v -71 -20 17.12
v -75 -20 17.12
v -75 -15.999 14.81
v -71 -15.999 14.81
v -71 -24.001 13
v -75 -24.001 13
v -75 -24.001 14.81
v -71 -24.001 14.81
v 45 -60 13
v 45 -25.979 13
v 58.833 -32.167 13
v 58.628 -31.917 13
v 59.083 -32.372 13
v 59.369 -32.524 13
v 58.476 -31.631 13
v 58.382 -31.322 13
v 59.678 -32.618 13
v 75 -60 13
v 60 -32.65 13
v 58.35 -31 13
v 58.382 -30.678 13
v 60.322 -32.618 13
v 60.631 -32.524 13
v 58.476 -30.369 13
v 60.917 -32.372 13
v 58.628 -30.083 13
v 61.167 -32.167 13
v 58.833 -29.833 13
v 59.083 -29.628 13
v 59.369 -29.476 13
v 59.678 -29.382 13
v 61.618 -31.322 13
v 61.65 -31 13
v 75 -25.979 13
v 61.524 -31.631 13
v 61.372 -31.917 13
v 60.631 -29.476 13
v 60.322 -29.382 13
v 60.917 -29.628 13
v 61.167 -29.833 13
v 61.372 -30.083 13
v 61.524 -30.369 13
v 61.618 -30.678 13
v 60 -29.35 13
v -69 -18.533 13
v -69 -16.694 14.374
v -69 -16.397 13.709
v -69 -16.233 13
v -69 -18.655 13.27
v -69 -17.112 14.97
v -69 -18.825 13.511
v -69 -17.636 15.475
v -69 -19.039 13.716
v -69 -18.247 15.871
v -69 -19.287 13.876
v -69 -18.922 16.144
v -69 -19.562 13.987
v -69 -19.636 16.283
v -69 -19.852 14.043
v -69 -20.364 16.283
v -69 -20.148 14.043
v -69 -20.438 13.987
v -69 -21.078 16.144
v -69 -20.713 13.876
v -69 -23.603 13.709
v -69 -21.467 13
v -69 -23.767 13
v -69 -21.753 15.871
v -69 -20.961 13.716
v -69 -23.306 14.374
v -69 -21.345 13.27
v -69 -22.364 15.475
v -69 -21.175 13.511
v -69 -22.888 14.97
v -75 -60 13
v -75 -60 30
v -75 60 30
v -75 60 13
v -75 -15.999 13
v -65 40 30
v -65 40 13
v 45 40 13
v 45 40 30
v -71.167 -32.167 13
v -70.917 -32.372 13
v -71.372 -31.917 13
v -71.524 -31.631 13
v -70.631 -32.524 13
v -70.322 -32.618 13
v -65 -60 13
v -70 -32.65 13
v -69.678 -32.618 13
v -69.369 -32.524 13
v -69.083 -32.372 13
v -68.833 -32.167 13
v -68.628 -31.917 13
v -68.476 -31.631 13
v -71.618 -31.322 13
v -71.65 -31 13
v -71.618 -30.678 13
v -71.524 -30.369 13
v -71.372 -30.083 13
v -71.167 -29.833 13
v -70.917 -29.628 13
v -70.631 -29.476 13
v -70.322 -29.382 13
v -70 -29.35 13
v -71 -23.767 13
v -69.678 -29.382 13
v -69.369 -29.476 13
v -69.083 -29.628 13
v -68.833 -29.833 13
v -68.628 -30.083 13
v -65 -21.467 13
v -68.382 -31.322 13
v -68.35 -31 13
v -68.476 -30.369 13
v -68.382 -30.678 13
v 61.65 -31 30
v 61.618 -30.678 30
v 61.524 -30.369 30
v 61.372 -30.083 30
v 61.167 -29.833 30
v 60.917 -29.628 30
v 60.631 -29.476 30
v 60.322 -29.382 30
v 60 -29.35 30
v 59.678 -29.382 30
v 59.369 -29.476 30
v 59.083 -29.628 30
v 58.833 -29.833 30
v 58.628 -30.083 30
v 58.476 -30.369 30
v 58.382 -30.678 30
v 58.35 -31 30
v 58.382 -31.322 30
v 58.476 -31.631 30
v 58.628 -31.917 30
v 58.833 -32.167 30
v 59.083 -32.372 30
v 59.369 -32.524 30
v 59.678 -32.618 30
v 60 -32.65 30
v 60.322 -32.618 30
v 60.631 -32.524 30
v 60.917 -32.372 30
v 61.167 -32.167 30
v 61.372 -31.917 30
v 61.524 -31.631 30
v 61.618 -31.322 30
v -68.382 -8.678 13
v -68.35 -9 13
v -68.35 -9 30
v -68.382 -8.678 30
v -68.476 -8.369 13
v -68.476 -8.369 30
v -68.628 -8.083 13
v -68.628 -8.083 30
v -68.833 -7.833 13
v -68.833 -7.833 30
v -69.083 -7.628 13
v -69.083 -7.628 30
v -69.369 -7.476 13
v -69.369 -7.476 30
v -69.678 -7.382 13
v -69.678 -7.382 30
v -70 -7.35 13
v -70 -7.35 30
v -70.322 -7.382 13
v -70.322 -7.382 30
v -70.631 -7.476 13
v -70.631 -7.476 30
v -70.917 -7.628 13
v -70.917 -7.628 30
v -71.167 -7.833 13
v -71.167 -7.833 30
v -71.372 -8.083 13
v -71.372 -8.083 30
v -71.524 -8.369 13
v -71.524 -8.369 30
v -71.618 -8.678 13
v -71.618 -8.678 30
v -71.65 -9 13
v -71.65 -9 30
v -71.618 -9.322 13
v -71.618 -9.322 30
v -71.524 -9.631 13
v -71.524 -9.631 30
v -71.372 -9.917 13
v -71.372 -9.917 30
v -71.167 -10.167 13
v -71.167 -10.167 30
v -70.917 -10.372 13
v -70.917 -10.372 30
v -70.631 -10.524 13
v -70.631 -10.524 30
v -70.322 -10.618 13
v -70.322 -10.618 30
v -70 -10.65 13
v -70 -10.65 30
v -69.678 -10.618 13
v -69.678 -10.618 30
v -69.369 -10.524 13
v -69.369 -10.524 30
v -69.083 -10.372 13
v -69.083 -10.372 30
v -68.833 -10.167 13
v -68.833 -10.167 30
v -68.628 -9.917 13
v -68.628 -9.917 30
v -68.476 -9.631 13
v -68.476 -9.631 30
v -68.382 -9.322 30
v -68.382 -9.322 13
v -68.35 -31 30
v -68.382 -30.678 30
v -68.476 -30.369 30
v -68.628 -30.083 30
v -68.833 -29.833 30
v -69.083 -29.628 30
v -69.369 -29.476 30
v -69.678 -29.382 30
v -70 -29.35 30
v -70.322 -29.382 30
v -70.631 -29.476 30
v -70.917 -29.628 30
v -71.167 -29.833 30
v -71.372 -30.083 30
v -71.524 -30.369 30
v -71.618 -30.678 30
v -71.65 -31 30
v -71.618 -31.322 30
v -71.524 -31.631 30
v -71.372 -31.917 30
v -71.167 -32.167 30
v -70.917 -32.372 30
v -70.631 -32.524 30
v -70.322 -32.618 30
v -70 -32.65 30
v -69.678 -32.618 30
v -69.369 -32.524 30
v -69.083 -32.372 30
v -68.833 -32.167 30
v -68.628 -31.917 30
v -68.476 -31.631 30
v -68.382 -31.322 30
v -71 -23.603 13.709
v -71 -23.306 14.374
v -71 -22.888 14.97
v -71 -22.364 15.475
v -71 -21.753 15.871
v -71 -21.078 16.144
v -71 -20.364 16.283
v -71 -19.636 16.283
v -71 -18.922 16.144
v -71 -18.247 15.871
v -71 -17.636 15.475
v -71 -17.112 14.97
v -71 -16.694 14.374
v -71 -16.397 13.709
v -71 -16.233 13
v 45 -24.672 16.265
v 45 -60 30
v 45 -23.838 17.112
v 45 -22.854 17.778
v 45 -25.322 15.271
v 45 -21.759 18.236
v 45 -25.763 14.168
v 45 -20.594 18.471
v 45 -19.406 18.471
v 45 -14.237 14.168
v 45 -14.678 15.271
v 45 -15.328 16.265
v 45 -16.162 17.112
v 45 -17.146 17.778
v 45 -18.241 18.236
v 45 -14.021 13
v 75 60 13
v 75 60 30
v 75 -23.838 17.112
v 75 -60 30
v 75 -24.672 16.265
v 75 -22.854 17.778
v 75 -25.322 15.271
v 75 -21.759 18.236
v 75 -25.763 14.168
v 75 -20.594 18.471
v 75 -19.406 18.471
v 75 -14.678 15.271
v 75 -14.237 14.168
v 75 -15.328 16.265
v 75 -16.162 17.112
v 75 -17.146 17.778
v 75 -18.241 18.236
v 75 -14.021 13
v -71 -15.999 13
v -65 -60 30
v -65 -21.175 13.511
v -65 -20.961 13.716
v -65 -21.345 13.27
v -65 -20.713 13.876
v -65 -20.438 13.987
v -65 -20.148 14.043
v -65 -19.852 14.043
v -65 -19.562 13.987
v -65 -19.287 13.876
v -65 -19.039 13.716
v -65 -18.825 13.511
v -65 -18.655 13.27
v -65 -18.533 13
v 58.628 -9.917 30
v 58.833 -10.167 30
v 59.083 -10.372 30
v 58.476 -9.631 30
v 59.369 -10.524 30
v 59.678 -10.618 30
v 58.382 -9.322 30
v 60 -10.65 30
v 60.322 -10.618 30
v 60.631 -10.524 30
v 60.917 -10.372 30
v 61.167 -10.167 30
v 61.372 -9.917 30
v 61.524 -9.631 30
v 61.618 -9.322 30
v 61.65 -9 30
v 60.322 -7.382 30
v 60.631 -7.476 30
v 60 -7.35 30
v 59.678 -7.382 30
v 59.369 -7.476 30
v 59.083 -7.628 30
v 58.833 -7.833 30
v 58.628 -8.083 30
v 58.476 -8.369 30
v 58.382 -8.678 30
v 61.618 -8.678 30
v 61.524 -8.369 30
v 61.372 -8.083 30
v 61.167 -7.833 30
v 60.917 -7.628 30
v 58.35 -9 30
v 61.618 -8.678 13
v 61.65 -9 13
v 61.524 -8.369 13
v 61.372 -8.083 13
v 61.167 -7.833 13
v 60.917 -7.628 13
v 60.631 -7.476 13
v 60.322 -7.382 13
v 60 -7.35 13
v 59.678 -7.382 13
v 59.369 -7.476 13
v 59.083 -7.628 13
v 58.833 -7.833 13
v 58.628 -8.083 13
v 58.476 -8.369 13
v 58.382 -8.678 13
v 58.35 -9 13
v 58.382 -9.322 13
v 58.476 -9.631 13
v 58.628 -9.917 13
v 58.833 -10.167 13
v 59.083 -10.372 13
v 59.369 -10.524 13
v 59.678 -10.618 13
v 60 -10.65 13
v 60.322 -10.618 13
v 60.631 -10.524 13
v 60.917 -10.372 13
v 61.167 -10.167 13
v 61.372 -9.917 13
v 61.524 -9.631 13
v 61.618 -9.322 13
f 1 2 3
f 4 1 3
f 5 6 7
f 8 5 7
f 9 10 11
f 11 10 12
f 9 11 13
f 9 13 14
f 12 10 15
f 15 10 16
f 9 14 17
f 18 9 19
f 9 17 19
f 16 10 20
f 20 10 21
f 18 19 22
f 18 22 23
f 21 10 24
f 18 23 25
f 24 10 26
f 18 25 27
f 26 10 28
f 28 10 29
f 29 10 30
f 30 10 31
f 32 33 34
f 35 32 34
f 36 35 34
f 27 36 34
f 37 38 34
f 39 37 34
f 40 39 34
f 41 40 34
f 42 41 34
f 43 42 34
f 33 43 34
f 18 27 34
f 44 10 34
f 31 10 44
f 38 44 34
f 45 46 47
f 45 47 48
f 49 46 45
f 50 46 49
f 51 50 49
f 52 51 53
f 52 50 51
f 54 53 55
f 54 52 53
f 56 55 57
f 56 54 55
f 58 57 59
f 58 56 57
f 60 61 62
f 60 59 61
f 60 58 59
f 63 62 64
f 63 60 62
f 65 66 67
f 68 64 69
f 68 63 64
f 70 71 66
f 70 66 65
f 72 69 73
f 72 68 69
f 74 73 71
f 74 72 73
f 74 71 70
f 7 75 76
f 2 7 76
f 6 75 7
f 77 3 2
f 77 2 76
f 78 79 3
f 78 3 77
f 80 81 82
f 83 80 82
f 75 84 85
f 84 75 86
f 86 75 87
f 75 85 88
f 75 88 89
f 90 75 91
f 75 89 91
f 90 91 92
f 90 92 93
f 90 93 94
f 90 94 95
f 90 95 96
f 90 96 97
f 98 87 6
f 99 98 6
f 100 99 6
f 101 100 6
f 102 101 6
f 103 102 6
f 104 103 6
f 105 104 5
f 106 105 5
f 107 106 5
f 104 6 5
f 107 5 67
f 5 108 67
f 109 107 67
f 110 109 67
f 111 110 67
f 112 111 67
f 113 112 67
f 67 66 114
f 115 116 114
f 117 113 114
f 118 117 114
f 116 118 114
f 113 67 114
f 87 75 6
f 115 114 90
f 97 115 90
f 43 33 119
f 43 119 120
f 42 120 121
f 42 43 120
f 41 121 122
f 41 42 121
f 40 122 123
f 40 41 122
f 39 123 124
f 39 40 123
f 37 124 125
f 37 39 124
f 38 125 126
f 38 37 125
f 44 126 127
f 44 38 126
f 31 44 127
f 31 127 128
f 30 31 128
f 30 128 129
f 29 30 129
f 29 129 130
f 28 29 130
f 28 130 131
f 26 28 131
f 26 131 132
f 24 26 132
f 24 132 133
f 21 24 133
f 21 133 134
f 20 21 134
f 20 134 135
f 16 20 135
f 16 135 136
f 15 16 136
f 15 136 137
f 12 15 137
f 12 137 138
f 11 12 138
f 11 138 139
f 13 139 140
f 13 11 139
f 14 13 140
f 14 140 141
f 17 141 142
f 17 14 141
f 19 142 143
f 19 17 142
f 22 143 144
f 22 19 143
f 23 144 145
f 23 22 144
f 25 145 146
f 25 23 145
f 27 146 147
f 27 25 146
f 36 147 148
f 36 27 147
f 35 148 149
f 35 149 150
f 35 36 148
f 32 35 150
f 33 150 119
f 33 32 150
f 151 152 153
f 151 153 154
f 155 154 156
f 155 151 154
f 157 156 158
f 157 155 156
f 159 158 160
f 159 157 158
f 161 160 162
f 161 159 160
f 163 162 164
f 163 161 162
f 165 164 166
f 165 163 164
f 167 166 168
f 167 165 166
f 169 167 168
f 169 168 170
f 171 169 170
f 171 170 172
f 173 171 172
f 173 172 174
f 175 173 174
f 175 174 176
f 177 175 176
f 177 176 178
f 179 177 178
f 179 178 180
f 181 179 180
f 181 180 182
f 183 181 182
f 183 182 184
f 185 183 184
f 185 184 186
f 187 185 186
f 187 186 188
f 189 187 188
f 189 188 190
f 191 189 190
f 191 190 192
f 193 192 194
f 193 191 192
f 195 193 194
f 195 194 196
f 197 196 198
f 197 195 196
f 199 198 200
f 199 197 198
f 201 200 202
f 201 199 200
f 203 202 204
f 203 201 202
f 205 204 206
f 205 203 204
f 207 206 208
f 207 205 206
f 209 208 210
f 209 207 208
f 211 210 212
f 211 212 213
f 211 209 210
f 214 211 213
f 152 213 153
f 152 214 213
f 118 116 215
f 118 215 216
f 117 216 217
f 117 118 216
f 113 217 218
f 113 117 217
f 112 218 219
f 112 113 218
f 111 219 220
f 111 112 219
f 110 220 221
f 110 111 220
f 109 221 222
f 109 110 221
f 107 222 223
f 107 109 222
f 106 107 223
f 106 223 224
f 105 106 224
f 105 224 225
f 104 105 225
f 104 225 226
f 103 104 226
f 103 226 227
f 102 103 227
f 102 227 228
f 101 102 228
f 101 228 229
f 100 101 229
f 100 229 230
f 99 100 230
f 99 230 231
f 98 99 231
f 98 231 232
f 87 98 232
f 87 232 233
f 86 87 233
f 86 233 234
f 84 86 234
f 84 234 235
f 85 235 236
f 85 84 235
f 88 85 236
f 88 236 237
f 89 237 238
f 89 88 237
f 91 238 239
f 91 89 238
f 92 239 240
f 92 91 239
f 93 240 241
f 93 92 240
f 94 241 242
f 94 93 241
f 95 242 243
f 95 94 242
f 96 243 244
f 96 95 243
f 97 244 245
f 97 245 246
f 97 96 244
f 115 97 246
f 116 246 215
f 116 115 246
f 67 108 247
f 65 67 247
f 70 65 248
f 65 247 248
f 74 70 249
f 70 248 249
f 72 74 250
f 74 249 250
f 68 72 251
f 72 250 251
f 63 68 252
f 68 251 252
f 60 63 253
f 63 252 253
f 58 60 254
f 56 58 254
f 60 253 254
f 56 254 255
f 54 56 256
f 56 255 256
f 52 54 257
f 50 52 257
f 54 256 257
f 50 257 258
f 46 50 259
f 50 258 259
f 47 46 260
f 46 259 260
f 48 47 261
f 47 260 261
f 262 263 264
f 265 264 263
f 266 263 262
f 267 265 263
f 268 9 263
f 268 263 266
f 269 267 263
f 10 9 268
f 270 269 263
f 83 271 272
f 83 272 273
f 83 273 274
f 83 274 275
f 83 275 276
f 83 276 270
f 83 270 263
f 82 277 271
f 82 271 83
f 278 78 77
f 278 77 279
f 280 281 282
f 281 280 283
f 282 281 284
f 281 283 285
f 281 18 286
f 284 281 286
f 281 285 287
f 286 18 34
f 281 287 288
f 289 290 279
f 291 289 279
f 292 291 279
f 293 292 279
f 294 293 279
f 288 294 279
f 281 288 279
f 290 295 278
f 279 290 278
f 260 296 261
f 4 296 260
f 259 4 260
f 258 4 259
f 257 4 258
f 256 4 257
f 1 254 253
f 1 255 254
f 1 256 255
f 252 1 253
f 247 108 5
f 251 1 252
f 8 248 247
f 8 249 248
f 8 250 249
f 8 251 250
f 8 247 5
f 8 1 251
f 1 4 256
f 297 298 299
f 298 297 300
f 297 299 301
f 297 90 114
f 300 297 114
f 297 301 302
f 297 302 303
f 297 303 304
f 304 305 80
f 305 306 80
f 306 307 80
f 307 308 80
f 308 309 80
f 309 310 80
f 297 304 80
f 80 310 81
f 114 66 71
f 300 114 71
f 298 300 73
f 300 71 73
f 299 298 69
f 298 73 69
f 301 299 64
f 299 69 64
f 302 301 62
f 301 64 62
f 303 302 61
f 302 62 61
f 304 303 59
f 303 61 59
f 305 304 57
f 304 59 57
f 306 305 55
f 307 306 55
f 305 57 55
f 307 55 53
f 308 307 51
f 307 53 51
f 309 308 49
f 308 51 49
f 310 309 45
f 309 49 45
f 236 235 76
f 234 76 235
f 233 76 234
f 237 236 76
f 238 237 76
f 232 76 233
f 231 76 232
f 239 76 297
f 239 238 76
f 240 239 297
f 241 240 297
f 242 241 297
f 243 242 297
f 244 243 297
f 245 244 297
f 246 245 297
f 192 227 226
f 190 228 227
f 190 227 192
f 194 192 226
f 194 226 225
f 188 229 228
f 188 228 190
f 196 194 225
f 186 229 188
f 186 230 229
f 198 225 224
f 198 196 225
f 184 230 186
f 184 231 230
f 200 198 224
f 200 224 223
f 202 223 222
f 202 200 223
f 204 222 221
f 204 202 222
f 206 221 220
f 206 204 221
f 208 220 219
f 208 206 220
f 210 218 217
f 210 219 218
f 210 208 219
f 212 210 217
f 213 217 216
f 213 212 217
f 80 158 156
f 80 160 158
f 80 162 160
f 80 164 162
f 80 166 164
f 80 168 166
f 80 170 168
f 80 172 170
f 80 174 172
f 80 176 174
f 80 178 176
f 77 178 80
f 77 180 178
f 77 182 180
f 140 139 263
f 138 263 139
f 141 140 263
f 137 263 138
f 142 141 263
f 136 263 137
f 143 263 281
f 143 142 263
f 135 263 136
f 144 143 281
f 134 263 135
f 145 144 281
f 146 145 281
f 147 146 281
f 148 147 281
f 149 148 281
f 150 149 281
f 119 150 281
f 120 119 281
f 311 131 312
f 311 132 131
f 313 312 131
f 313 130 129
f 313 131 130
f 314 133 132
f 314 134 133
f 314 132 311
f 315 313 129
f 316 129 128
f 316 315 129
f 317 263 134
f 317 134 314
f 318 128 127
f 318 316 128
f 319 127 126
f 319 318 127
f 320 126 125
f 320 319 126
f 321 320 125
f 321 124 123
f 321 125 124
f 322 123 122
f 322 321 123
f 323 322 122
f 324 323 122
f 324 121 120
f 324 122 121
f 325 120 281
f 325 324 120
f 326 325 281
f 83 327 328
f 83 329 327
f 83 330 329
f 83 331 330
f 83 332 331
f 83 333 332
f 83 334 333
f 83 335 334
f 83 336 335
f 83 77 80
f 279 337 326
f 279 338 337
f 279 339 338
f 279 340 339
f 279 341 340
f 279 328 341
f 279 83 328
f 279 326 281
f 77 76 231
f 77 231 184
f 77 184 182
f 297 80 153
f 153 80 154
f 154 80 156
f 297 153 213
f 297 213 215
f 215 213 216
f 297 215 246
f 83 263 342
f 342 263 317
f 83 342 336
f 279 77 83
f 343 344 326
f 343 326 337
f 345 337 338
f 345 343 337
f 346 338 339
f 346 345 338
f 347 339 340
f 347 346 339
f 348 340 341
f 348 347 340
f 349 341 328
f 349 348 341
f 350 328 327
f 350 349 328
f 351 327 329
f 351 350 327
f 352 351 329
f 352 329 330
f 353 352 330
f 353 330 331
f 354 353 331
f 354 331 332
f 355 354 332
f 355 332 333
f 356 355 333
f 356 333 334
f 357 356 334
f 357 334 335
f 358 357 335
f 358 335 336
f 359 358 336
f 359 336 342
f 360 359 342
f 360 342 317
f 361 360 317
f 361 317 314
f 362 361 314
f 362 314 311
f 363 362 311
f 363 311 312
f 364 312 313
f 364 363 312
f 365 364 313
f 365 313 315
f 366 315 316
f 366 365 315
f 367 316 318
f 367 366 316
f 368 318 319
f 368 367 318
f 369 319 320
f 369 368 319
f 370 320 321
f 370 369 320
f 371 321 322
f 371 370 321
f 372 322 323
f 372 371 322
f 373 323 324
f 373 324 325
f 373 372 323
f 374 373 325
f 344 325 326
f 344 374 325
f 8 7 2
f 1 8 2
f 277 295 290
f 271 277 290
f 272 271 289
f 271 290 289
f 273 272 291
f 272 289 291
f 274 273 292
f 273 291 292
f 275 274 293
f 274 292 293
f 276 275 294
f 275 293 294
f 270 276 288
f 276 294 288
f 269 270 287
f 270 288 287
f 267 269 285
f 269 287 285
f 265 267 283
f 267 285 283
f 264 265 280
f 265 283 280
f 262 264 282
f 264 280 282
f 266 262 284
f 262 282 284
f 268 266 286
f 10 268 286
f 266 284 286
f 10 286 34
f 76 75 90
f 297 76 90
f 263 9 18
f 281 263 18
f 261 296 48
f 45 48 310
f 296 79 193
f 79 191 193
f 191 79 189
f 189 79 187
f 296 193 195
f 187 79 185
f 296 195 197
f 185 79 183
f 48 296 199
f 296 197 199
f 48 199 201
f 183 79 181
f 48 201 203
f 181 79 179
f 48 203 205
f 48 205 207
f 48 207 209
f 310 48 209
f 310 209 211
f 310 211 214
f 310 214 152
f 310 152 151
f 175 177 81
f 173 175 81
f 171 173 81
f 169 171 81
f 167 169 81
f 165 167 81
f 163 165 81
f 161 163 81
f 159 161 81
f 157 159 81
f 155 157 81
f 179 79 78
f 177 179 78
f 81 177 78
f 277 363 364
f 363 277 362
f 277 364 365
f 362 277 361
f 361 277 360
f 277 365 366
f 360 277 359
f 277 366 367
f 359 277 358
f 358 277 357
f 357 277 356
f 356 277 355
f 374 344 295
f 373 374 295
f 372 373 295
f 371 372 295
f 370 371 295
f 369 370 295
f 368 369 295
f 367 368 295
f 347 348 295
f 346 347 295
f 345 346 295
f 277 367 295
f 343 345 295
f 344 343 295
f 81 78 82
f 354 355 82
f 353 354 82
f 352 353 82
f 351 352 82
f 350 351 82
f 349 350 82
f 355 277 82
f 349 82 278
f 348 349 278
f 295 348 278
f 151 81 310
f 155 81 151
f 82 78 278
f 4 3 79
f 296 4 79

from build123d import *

# Parameters (mm, degrees)
F0_W      = 150
F0_H      = 120
F1_DEPTH  = 30
F3_W      = 110
F3_H      = 100
F4_DEPTH  = 30
F5_DEPTH  = 4
F6_R      = 3.8
F7_DEPTH  = 2
F8_R      = 1.55
F9_DEPTH  = 7
F10_R     = 6
F12_DEPTH = 30
F11_R     = 0.5
F13_DEPTH = 1
F14_W     = 150
F14_H     = 120
F15_DEPTH = 13
F16_R     = 1.65
F17_DEPTH = 30


with BuildPart() as f1:
    # F0 (on Top) → F1 (new body)
    with BuildSketch(Plane.XY):
        Rectangle(F0_W, F0_H)
    extrude(amount=F1_DEPTH)

    # F3 (on Top) → F4 (cut, through all)
    with BuildSketch(Plane.XY):
        with Locations((-10, -10)):
            Rectangle(F3_W, F3_H)
    extrude(amount=F4_DEPTH, mode=Mode.SUBTRACT)

    # F2 (on face) → F5 (cut)
    with BuildSketch(Plane(origin=(-75, 0, 0), x_dir=(0, -1, 0), z_dir=(-1, 0, 0))):
        Polygon((20, 17.12), (15.998963, 14.81), (15.998963, 10.19), (20, 7.88), (24.001037, 10.19), (24.001037, 14.81), align=None)
    extrude(amount=-F5_DEPTH, mode=Mode.SUBTRACT)

    # F6 (on face) → F7 (cut)
    with BuildSketch(Plane(origin=(-71, 0, 0), x_dir=(0, -1, 0), z_dir=(-1, 0, 0))):
        with Locations((20, 12.5)):
            Circle(F6_R)
    extrude(amount=-F7_DEPTH, mode=Mode.SUBTRACT)

    # F8 (on face) → F9 (cut)
    with BuildSketch(Plane(origin=(-69, 0, 0), x_dir=(0, -1, 0), z_dir=(-1, 0, 0))):
        with Locations((20, 12.5)):
            Circle(F8_R)
    extrude(amount=-F9_DEPTH, mode=Mode.SUBTRACT)

    # F10 (on face) → F12 (cut, through all)
    with BuildSketch(Plane.YZ.offset(75)):
        with Locations((-20, 12.5)):
            Circle(F10_R)
    extrude(amount=-F12_DEPTH, mode=Mode.SUBTRACT)

    # F11 (on face) → F13 (cut)
    with BuildSketch(Plane(origin=(0, 60, 0), x_dir=(-1, 0, 0), z_dir=(0, 1, 0))):
        with Locations((20, 6)):
            Circle(F11_R)
        with Locations((-5, 6)):
            Circle(F11_R)
    extrude(amount=-F13_DEPTH, mode=Mode.SUBTRACT)

    # F14 (on Top) → F15 (cut)
    with BuildSketch(Plane.XY):
        Rectangle(F14_W, F14_H)
    extrude(amount=F15_DEPTH, mode=Mode.SUBTRACT)

    # F16 (on Top) → F17 (cut, through all)
    with BuildSketch(Plane.XY):
        with Locations((-70, -9)):
            Circle(F16_R)
        with Locations((-70, -31)):
            Circle(F16_R)
        with Locations((60, -9)):
            Circle(F16_R)
        with Locations((60, -31)):
            Circle(F16_R)
    extrude(amount=F17_DEPTH, mode=Mode.SUBTRACT)


solid = f1.part
